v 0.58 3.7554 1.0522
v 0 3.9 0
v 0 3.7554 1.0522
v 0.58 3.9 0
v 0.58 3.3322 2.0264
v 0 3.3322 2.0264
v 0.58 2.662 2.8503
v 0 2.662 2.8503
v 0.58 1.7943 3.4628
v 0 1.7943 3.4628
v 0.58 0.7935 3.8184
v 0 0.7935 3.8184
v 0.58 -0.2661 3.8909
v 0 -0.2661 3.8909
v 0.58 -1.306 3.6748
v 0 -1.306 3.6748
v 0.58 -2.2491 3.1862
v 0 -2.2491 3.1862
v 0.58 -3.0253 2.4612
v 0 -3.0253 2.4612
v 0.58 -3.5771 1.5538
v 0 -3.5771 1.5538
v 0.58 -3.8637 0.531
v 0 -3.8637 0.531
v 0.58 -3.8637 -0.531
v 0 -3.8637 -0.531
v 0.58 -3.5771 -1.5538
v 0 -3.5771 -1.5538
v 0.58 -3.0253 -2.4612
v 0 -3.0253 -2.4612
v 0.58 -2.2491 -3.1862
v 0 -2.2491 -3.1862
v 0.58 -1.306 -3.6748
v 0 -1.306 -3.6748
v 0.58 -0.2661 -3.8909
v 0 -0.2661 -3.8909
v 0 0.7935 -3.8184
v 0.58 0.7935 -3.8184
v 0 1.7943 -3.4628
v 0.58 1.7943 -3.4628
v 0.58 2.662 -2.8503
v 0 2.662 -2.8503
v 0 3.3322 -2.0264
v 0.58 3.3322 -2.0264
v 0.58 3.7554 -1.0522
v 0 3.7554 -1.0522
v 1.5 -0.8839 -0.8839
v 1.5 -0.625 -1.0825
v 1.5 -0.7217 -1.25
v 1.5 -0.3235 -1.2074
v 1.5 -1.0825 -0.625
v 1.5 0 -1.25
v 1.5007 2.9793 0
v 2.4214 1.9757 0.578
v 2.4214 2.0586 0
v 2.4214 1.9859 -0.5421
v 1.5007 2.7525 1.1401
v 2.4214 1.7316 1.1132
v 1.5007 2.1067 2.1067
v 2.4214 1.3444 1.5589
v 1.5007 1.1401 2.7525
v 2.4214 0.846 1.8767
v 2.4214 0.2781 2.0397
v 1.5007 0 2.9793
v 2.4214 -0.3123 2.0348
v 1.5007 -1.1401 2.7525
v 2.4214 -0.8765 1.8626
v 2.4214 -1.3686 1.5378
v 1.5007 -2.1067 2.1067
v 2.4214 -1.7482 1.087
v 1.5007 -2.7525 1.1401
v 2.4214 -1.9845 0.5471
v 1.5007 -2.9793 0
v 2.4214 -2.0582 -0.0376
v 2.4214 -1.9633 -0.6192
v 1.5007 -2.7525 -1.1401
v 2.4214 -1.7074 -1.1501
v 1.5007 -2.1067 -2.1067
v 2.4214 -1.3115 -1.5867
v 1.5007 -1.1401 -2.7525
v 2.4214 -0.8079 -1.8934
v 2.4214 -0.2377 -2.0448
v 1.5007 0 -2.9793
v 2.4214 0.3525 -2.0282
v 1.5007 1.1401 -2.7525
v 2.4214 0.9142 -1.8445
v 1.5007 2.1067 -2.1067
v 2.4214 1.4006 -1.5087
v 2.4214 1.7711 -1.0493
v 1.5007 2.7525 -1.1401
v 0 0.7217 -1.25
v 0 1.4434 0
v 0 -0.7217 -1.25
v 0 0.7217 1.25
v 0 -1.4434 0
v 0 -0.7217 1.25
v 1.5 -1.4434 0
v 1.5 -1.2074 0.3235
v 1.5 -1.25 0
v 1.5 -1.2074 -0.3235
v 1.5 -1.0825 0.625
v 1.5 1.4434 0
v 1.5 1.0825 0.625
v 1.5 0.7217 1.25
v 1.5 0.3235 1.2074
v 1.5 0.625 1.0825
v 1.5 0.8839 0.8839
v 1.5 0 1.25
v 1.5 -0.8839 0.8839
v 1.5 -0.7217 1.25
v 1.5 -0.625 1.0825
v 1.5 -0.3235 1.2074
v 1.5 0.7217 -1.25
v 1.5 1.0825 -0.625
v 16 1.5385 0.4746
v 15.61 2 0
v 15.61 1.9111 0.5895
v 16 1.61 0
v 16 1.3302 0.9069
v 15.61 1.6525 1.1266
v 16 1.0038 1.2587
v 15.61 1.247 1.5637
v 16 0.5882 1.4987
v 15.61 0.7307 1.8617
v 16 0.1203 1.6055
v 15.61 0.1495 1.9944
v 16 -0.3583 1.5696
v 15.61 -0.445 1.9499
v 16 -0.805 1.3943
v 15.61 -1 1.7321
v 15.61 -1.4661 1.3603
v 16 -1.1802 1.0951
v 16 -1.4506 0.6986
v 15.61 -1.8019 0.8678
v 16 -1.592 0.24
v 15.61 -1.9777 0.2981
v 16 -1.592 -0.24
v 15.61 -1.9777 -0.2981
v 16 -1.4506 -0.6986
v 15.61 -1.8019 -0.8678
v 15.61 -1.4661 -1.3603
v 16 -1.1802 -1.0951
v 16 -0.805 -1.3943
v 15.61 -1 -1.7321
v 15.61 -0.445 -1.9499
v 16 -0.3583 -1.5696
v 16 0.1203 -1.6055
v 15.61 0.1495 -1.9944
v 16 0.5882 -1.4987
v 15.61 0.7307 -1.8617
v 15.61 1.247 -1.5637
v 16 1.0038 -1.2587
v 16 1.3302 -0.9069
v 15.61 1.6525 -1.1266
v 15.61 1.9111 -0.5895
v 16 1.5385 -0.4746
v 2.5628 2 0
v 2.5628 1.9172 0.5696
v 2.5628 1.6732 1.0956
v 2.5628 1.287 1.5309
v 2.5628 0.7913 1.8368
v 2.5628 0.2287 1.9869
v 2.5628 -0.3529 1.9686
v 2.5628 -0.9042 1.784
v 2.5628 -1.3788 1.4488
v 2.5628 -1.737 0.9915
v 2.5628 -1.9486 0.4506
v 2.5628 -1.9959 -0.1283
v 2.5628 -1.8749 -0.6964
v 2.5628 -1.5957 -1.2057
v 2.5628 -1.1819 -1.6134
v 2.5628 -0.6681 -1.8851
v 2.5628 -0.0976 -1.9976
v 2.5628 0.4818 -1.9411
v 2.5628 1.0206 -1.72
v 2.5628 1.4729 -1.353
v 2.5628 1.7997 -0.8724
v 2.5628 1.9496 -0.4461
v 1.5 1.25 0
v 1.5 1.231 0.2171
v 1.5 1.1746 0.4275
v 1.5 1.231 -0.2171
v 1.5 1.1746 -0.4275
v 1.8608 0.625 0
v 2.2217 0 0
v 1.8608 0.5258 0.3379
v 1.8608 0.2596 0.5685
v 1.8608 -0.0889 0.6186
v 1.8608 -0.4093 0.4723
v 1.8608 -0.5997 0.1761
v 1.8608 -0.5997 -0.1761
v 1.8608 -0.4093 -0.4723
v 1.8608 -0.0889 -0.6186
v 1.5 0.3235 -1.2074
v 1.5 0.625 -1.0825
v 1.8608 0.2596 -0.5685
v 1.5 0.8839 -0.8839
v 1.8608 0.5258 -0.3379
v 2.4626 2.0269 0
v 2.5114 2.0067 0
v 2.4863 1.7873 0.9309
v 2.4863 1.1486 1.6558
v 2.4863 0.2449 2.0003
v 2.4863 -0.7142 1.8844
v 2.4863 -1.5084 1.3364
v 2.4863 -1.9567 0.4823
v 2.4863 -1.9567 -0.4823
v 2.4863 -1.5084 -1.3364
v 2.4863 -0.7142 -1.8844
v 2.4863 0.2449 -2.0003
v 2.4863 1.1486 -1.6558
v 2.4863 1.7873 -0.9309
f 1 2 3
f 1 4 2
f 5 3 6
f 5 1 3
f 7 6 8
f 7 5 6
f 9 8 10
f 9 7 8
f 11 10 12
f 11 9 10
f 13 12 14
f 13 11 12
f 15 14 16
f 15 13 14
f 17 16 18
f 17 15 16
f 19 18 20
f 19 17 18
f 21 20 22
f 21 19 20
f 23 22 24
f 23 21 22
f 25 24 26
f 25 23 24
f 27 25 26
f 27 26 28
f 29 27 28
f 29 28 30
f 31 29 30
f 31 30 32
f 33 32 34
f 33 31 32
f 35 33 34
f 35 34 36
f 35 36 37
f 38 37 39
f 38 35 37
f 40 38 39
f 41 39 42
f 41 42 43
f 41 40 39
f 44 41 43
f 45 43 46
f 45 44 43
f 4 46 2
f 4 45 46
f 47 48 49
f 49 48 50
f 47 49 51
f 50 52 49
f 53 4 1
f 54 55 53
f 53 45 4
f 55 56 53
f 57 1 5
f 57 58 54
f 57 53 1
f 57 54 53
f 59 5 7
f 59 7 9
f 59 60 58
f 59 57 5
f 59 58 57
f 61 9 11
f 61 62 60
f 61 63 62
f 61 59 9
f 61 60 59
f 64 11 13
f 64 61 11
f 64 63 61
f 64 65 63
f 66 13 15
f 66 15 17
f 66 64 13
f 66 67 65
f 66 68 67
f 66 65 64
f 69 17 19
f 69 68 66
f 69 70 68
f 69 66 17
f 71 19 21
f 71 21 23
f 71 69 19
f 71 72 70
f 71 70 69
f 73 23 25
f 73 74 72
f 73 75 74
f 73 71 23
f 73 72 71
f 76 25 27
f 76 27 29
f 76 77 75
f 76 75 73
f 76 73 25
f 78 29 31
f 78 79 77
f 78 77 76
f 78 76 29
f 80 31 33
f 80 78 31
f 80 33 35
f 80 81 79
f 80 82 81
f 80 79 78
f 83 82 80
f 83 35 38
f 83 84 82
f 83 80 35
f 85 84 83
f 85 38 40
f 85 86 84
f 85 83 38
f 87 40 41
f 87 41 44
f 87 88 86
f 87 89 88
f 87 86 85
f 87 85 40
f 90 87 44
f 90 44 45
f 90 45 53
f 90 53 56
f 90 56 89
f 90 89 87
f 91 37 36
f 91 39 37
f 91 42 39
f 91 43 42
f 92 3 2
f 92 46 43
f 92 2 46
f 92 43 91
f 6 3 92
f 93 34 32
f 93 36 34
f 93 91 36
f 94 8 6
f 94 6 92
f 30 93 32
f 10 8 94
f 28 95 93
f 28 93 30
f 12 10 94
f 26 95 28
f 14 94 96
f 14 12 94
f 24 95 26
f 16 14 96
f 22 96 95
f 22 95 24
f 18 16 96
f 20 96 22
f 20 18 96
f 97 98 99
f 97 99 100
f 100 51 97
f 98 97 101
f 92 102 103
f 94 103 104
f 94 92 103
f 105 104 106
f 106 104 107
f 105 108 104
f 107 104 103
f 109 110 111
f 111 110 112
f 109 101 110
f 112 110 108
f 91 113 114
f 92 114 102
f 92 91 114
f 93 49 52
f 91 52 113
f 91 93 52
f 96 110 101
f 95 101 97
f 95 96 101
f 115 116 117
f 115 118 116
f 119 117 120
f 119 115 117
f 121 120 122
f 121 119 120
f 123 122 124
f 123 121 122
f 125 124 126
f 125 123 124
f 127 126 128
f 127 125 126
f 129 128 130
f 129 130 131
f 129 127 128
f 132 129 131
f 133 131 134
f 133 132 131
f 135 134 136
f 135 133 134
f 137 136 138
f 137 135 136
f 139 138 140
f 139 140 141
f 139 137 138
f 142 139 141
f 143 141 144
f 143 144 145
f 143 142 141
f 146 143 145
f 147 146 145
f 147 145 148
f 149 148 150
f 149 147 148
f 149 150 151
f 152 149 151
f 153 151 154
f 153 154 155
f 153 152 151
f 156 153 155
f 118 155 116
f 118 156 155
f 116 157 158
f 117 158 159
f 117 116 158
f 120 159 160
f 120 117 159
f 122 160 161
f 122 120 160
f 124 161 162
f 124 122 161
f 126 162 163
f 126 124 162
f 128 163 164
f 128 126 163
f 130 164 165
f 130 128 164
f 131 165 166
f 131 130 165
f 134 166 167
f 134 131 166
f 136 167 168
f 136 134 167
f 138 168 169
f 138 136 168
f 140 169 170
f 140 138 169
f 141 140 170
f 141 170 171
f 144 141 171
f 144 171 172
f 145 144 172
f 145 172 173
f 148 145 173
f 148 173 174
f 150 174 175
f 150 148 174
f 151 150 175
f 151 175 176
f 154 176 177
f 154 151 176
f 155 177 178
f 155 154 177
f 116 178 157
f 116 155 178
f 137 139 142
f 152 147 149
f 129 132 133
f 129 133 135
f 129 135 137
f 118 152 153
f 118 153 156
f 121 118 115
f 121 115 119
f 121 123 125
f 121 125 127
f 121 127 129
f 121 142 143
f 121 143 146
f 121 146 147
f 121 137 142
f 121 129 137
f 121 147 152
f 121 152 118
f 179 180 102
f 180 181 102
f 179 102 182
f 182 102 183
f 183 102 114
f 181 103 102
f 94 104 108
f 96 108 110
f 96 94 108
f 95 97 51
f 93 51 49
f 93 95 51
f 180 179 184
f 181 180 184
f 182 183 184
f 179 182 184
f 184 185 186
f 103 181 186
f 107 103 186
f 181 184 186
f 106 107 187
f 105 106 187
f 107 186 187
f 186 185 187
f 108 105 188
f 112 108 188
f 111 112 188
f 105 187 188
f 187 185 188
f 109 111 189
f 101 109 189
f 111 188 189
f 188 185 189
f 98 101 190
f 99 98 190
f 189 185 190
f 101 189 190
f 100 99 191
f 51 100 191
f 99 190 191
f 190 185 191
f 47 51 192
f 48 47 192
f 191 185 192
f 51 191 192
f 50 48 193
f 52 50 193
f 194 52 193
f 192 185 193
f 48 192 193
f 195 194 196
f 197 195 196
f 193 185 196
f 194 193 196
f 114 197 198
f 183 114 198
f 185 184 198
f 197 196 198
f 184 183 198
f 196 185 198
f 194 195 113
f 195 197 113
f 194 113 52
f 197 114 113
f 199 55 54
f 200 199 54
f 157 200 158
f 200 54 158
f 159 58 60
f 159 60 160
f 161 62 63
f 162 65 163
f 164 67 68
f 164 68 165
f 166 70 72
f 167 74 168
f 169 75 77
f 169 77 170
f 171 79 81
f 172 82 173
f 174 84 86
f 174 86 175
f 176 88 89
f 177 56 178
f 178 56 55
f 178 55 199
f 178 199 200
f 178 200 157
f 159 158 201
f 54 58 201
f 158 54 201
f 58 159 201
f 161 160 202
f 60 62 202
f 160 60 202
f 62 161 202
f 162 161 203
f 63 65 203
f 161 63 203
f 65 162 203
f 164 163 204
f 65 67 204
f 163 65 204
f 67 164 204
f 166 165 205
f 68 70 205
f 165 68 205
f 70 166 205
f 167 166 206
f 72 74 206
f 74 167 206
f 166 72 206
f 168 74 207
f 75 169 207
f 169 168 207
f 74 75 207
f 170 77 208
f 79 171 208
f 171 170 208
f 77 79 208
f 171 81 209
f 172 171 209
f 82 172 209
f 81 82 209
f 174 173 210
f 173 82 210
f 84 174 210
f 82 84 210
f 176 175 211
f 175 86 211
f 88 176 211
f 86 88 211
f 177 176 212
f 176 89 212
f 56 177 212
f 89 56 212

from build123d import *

# Parameters (mm, degrees)
FILLET1_R   = 0.2
HEX_2_DEPTH = 1.5


with BuildPart() as part:
    # BodySke → BaseBody (revolve)
    with BuildSketch(Plane.XY):
        Polygon((0, 0), (0, 3.9), (0.58, 3.9), (2.48, 2), (15.61, 2), (16, 1.61), (16, 0), align=None)
    revolve(axis=Axis((0, 0, 0), (1, 0, 0)))

    # Fillet1
    fillet1_edges = [part.edges().sort_by_distance(p)[0] for p in [
        (2.48, -2, 0),
    ]]
    fillet(fillet1_edges, radius=FILLET1_R)

    # Sketch2 → PreBroach (revolve, cut)
    with BuildSketch(Plane.XY):
        Polygon((0, 1.25), (1.5, 1.25), (2.221687836, 0), (0, 0), align=None)
    revolve(axis=Axis((0, 0, 0), (1, 0, 0)), mode=Mode.SUBTRACT)

    # Sketch3 → Hex 2 (cut)
    with BuildSketch(Plane.ZY):
        Polygon((-1.25, -0.721687836), (-1.25, 0.721687836), (0, 1.443375673), (1.25, 0.721687836), (1.25, -0.721687836), (0, -1.443375673), align=None)
    extrude(amount=-HEX_2_DEPTH, mode=Mode.SUBTRACT)


solid = part.part
